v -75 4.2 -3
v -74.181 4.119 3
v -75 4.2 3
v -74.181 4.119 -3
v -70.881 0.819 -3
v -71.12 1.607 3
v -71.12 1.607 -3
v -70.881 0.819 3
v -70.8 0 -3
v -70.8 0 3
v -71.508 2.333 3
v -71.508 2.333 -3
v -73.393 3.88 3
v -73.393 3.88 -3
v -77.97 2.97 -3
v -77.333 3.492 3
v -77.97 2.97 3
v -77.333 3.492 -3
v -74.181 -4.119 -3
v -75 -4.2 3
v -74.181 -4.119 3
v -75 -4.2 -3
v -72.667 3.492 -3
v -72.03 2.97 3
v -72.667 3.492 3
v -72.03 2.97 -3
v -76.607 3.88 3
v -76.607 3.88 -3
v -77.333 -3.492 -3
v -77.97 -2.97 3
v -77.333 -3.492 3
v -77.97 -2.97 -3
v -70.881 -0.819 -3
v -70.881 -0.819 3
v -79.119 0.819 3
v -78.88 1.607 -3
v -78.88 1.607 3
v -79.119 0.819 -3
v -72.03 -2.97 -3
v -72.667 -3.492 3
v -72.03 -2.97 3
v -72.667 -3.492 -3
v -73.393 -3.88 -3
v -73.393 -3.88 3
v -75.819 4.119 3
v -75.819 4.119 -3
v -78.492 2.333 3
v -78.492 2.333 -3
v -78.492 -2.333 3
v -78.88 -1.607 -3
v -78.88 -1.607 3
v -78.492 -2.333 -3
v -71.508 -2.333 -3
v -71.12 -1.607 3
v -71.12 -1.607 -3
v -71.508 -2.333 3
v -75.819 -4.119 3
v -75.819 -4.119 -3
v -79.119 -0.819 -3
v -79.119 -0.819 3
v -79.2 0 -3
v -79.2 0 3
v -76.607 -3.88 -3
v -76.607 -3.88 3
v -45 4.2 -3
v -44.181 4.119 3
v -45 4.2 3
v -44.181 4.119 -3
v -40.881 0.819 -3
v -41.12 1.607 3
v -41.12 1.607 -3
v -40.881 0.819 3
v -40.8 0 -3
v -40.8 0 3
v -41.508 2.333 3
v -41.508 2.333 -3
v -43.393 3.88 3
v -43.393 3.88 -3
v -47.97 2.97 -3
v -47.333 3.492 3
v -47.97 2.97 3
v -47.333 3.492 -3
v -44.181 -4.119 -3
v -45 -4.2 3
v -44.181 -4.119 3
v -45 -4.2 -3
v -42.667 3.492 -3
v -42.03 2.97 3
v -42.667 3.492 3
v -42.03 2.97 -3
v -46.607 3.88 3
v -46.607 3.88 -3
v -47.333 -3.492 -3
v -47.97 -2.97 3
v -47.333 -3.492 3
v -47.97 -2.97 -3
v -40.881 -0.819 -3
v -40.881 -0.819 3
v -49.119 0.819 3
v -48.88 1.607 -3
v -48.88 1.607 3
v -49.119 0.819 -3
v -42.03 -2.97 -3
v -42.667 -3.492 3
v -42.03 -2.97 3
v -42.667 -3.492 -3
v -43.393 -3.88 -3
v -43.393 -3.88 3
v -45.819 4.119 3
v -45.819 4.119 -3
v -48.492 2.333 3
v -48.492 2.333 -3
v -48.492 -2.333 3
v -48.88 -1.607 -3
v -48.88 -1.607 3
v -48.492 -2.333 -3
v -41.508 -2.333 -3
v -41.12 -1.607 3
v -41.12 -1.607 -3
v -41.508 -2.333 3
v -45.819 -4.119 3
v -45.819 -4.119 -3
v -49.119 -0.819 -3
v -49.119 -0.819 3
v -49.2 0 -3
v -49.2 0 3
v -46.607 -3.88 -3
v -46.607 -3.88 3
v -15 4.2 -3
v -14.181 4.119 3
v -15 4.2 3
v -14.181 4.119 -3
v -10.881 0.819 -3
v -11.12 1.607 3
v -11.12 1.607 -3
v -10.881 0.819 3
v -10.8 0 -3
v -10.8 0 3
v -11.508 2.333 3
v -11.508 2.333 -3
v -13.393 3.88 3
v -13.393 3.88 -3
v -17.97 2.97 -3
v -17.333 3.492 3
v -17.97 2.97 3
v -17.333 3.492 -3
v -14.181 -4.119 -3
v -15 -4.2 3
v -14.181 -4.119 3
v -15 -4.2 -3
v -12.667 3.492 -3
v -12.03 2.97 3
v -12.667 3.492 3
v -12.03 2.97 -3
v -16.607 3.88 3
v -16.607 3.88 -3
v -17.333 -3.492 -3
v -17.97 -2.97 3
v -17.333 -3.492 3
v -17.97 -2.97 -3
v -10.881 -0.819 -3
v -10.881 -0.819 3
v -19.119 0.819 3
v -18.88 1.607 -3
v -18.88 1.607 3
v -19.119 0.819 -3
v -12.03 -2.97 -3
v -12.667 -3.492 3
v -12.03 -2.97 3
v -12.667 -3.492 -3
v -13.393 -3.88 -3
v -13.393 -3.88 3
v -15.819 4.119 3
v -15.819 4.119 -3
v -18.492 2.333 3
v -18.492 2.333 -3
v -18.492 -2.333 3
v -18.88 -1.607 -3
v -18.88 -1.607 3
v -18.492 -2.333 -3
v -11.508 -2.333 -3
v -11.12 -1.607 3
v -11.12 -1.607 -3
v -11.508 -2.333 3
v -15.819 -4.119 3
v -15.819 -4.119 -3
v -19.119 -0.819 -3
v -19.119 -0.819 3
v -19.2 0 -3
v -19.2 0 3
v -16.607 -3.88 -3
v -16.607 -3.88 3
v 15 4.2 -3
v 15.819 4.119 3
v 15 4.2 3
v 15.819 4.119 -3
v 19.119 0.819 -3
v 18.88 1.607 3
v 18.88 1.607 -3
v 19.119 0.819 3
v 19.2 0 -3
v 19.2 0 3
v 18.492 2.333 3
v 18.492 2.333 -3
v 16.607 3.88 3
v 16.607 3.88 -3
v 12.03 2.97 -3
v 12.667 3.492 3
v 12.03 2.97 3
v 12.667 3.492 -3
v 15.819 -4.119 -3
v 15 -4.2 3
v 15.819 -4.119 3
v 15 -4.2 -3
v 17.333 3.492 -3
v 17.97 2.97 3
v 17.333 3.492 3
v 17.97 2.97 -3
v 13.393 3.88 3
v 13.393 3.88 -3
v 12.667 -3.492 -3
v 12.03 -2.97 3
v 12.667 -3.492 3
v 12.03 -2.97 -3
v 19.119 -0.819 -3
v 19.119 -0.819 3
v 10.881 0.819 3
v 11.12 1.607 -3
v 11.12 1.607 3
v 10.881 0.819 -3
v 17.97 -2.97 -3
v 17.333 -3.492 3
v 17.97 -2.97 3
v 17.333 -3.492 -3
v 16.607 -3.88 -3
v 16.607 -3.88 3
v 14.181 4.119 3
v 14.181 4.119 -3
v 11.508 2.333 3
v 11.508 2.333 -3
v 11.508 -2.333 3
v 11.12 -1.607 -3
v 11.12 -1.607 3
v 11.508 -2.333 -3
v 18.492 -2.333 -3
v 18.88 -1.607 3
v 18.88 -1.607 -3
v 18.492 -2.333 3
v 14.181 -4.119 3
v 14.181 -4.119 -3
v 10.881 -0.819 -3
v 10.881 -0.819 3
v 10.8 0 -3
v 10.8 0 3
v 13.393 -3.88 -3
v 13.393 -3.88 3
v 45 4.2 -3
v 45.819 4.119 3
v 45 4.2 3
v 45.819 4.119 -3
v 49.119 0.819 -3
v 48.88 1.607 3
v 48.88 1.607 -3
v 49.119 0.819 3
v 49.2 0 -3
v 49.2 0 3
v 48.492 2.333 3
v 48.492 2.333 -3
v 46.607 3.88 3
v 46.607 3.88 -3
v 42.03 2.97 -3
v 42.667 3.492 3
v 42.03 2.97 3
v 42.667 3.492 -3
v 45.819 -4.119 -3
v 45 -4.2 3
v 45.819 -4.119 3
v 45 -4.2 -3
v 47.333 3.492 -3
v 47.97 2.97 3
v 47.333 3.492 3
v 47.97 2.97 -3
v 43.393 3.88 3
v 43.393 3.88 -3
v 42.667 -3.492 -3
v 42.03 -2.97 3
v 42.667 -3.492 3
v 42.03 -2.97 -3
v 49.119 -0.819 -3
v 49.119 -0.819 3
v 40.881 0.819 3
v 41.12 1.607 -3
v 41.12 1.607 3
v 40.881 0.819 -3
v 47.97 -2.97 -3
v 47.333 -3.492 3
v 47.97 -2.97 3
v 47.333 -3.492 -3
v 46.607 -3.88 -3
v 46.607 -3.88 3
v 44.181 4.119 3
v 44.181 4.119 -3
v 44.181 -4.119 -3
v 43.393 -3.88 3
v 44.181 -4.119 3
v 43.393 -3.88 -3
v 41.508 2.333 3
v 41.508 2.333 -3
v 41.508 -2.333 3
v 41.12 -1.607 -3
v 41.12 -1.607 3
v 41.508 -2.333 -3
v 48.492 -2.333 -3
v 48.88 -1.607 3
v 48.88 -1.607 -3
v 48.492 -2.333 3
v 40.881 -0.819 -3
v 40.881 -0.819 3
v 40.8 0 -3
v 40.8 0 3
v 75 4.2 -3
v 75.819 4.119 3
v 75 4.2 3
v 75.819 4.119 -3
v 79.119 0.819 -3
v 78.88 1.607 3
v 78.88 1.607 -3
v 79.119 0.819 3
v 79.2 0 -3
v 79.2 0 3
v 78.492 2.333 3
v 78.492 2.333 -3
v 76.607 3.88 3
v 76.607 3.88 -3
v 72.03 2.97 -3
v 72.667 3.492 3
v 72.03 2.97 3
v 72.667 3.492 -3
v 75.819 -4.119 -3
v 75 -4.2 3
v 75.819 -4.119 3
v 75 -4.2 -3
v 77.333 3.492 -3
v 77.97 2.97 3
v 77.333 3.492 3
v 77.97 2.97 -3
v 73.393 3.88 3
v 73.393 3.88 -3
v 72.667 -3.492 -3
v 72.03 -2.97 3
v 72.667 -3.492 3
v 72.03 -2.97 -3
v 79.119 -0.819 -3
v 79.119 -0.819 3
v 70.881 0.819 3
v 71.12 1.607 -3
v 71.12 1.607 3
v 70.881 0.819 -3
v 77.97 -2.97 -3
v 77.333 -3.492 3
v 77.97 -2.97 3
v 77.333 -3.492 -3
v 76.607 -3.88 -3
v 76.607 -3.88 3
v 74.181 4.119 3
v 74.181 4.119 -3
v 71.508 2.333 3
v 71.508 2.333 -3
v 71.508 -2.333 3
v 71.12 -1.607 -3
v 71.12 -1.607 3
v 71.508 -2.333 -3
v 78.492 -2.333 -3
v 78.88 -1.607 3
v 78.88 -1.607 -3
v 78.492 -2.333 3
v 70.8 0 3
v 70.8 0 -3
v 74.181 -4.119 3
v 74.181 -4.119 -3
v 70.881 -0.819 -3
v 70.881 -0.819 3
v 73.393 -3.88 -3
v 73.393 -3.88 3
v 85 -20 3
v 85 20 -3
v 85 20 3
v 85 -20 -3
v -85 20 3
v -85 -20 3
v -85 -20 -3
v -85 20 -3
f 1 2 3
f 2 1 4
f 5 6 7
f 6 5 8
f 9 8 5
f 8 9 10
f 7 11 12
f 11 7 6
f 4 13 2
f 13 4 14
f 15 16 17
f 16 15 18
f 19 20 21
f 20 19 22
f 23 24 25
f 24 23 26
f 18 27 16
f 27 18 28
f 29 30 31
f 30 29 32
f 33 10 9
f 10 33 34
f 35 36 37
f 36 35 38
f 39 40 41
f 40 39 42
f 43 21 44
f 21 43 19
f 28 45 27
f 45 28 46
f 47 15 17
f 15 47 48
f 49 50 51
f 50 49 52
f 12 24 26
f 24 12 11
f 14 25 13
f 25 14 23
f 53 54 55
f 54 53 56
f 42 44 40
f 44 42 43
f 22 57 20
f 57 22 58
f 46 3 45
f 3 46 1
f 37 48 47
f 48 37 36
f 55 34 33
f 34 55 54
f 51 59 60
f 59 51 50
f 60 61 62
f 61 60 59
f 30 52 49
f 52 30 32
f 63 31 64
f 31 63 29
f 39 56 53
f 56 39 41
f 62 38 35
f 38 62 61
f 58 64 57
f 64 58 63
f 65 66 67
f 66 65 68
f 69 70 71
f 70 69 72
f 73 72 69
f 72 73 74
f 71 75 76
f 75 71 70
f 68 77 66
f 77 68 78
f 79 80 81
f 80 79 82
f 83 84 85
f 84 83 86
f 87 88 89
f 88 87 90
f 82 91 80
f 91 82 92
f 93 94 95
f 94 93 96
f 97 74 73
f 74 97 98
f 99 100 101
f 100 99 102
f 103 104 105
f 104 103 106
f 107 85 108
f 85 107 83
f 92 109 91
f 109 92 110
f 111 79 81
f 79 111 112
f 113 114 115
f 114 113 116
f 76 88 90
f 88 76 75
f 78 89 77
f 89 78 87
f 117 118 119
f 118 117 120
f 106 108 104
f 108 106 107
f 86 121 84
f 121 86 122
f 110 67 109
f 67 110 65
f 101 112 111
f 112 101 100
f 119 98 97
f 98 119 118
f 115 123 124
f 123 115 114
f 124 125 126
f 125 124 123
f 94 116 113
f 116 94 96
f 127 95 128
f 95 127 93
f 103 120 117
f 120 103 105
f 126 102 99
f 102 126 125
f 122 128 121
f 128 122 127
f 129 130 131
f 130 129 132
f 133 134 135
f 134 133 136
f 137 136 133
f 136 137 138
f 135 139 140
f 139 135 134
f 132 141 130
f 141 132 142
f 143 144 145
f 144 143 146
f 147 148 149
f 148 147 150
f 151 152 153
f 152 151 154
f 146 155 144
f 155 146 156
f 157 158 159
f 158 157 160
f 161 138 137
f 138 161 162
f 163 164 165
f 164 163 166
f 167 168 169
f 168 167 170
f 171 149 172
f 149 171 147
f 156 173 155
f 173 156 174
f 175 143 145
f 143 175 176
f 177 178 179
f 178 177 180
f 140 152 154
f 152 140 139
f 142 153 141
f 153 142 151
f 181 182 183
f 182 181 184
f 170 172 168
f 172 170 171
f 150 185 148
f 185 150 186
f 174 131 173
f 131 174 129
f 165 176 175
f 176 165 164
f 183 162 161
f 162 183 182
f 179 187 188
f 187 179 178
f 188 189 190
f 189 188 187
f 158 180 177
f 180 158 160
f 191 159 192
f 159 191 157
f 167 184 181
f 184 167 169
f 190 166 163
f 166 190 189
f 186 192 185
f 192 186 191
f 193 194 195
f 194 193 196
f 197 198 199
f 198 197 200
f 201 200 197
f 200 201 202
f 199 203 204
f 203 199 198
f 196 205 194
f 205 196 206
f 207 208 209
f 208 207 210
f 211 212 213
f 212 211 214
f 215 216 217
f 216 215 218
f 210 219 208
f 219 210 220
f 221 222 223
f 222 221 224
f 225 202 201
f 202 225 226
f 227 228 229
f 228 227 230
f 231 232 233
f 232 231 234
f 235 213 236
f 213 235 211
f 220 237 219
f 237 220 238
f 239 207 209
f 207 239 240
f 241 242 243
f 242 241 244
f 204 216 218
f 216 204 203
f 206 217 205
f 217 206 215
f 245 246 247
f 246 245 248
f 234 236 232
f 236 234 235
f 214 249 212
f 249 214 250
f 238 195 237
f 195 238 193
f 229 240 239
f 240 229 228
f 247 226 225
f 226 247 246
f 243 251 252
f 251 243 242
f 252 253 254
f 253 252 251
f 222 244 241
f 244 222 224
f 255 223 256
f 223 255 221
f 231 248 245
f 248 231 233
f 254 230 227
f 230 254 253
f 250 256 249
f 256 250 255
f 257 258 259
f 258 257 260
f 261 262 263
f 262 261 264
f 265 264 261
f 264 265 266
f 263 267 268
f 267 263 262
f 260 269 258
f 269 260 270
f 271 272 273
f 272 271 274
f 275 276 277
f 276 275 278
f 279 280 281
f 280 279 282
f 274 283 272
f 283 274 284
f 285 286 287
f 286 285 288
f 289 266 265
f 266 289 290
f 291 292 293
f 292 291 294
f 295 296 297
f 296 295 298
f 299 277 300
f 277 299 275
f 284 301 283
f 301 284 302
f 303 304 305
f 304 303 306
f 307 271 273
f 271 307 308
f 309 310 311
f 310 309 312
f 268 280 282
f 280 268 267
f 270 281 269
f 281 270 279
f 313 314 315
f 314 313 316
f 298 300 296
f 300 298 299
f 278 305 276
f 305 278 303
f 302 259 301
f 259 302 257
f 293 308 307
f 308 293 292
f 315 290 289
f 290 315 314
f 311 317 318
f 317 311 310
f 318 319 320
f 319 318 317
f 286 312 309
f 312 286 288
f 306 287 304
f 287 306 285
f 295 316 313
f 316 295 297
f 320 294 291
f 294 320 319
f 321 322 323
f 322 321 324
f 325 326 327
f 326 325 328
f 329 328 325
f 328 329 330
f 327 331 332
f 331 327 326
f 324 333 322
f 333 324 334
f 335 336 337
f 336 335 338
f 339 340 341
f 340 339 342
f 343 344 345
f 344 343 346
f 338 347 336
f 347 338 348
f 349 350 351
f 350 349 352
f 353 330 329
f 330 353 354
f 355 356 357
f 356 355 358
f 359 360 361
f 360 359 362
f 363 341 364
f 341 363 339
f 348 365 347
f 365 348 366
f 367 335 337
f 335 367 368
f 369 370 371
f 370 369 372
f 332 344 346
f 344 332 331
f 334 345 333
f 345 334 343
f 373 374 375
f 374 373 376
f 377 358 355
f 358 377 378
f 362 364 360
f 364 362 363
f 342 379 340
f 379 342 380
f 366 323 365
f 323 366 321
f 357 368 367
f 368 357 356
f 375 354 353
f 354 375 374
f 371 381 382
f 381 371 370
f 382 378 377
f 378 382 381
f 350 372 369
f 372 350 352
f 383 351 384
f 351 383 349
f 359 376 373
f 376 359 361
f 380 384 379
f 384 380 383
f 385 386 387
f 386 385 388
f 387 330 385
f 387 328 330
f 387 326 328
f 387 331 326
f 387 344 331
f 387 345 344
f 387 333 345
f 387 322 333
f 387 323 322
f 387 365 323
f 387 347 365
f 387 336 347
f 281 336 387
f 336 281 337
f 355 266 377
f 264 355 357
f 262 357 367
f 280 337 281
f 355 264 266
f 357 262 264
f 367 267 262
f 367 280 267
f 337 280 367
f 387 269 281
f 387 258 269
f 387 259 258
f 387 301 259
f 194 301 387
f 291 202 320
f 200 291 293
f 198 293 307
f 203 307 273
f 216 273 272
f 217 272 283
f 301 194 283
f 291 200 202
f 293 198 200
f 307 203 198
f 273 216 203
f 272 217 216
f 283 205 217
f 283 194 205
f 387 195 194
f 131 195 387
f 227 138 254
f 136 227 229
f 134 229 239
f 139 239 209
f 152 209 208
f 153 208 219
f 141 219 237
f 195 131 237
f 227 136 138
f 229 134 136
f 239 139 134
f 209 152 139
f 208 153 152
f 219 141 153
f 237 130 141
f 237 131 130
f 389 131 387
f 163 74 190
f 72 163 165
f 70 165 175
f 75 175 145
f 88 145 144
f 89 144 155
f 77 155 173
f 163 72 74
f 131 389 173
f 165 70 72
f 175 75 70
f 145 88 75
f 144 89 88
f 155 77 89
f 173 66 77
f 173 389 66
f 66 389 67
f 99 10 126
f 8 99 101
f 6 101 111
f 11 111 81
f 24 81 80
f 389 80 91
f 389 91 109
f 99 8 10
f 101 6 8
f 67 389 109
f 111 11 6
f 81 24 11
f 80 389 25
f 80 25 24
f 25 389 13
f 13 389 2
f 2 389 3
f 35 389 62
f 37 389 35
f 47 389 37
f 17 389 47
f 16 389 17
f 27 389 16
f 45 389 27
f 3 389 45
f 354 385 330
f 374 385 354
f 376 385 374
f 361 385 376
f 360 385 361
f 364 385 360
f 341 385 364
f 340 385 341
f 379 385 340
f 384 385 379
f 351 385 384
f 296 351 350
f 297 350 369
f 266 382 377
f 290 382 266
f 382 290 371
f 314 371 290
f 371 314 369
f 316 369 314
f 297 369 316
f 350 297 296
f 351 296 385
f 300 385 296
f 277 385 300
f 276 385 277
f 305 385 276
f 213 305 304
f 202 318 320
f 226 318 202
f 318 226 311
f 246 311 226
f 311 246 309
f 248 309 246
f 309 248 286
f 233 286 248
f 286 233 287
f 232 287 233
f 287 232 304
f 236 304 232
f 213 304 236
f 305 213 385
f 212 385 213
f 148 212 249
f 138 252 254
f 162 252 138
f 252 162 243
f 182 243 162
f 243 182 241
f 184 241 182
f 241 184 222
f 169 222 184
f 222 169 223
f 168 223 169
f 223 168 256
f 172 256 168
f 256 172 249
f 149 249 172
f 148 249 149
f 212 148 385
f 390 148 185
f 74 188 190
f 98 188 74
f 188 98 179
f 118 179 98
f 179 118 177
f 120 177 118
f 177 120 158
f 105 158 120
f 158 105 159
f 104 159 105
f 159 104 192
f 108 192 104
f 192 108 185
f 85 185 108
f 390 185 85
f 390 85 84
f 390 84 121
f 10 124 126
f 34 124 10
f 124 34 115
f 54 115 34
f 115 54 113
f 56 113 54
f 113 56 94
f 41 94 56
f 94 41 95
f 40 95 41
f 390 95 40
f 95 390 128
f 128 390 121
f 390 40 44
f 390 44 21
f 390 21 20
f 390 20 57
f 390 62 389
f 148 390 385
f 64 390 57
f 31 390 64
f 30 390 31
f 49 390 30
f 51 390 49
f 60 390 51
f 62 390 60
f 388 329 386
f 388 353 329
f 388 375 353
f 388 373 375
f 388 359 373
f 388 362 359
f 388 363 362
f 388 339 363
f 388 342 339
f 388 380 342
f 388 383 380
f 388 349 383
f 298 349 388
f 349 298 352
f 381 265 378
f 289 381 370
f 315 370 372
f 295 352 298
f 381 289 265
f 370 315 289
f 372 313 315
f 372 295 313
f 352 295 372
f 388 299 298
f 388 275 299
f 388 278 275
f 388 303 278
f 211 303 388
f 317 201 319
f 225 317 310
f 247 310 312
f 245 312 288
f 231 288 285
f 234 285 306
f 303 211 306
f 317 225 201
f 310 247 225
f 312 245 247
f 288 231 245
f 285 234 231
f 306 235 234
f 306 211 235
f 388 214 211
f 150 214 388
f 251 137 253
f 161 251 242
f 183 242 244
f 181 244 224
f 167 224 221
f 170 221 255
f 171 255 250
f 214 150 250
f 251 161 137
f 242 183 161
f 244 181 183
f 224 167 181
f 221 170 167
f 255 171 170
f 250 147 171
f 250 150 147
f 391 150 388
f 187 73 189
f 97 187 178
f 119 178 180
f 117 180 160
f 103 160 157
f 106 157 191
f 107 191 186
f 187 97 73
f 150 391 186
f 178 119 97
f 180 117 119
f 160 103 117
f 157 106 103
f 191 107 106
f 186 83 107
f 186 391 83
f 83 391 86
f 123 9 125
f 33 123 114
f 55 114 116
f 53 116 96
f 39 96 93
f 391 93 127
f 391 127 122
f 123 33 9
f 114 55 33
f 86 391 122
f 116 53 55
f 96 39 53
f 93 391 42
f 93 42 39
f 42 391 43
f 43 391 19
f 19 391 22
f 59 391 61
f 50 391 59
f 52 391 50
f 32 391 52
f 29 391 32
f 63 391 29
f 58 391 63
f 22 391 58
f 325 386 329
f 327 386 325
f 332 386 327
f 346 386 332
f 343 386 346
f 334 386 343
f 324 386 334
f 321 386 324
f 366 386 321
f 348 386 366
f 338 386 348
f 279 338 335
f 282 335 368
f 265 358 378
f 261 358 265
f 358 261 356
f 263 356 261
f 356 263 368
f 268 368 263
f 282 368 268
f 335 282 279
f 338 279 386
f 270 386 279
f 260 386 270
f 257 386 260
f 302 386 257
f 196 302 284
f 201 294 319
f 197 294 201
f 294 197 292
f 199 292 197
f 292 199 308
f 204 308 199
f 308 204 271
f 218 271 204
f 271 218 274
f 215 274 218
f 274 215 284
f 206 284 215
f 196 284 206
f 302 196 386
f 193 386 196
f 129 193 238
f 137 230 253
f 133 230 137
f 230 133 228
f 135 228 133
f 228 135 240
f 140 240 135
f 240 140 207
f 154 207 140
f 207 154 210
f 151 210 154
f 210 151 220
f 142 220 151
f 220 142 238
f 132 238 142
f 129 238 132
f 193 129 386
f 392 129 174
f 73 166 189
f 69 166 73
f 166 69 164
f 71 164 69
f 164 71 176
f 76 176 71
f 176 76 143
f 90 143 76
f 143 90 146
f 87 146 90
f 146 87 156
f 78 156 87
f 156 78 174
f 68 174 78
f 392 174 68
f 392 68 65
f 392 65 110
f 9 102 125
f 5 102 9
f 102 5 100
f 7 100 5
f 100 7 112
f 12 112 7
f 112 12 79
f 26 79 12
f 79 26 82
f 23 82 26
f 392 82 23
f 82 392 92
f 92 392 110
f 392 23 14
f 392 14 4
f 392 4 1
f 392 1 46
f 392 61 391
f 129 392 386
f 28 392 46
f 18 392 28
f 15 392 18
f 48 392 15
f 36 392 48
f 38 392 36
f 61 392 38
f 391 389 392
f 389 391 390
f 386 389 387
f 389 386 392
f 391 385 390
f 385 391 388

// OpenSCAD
$fn = 32;

// ----------------------------------------------------------------------
// Hole bar, 6 x Ø8.4
// skip layout, 10 mm edge offset
// ----------------------------------------------------------------------

// --- parameters (mm) ---
bar_w = 40;       // bar width (Y)
seat_tol = 0.1;   // tolerance at the seating features
free_tol = 0.3;   // general tolerance on the free sizes
bar_t = 6;        // bar thickness (Z)
holes = 6;        // holes per row
hole_d = 8.4;     // hole diameter
edge = 10;        // offset from the bar end to the first hole
grid_pitch = 15;  // grid the bar was laid out on

// --- derived feature positions (mm) ---
pitch = grid_pitch * 2;       // = 30   holes sit every other grid slot
span = (holes - 1) * pitch;   // = 150   distance between the end holes
bar_l = span + 2 * edge;      // = 170   overall bar length
start_x = -bar_l / 2 + edge;  // = -75   X of the first hole
feature_centers = [
  [start_x + 0 * pitch, 0],
  [start_x + 1 * pitch, 0],
  [start_x + 2 * pitch, 0],
  [start_x + 3 * pitch, 0],
  [start_x + 4 * pitch, 0],
  [start_x + 5 * pitch, 0]
];   // hole centres of the first row

// bar with one row of holes, drilled from feature_centers
difference() {
  translate([-bar_l / 2, -bar_w / 2, -bar_t / 2]) cube([bar_l, bar_w, bar_t]);
  for (centre = feature_centers)
    translate([centre[0], centre[1], 0])
      cylinder(d = hole_d, h = bar_t + 2, center = true);
}
